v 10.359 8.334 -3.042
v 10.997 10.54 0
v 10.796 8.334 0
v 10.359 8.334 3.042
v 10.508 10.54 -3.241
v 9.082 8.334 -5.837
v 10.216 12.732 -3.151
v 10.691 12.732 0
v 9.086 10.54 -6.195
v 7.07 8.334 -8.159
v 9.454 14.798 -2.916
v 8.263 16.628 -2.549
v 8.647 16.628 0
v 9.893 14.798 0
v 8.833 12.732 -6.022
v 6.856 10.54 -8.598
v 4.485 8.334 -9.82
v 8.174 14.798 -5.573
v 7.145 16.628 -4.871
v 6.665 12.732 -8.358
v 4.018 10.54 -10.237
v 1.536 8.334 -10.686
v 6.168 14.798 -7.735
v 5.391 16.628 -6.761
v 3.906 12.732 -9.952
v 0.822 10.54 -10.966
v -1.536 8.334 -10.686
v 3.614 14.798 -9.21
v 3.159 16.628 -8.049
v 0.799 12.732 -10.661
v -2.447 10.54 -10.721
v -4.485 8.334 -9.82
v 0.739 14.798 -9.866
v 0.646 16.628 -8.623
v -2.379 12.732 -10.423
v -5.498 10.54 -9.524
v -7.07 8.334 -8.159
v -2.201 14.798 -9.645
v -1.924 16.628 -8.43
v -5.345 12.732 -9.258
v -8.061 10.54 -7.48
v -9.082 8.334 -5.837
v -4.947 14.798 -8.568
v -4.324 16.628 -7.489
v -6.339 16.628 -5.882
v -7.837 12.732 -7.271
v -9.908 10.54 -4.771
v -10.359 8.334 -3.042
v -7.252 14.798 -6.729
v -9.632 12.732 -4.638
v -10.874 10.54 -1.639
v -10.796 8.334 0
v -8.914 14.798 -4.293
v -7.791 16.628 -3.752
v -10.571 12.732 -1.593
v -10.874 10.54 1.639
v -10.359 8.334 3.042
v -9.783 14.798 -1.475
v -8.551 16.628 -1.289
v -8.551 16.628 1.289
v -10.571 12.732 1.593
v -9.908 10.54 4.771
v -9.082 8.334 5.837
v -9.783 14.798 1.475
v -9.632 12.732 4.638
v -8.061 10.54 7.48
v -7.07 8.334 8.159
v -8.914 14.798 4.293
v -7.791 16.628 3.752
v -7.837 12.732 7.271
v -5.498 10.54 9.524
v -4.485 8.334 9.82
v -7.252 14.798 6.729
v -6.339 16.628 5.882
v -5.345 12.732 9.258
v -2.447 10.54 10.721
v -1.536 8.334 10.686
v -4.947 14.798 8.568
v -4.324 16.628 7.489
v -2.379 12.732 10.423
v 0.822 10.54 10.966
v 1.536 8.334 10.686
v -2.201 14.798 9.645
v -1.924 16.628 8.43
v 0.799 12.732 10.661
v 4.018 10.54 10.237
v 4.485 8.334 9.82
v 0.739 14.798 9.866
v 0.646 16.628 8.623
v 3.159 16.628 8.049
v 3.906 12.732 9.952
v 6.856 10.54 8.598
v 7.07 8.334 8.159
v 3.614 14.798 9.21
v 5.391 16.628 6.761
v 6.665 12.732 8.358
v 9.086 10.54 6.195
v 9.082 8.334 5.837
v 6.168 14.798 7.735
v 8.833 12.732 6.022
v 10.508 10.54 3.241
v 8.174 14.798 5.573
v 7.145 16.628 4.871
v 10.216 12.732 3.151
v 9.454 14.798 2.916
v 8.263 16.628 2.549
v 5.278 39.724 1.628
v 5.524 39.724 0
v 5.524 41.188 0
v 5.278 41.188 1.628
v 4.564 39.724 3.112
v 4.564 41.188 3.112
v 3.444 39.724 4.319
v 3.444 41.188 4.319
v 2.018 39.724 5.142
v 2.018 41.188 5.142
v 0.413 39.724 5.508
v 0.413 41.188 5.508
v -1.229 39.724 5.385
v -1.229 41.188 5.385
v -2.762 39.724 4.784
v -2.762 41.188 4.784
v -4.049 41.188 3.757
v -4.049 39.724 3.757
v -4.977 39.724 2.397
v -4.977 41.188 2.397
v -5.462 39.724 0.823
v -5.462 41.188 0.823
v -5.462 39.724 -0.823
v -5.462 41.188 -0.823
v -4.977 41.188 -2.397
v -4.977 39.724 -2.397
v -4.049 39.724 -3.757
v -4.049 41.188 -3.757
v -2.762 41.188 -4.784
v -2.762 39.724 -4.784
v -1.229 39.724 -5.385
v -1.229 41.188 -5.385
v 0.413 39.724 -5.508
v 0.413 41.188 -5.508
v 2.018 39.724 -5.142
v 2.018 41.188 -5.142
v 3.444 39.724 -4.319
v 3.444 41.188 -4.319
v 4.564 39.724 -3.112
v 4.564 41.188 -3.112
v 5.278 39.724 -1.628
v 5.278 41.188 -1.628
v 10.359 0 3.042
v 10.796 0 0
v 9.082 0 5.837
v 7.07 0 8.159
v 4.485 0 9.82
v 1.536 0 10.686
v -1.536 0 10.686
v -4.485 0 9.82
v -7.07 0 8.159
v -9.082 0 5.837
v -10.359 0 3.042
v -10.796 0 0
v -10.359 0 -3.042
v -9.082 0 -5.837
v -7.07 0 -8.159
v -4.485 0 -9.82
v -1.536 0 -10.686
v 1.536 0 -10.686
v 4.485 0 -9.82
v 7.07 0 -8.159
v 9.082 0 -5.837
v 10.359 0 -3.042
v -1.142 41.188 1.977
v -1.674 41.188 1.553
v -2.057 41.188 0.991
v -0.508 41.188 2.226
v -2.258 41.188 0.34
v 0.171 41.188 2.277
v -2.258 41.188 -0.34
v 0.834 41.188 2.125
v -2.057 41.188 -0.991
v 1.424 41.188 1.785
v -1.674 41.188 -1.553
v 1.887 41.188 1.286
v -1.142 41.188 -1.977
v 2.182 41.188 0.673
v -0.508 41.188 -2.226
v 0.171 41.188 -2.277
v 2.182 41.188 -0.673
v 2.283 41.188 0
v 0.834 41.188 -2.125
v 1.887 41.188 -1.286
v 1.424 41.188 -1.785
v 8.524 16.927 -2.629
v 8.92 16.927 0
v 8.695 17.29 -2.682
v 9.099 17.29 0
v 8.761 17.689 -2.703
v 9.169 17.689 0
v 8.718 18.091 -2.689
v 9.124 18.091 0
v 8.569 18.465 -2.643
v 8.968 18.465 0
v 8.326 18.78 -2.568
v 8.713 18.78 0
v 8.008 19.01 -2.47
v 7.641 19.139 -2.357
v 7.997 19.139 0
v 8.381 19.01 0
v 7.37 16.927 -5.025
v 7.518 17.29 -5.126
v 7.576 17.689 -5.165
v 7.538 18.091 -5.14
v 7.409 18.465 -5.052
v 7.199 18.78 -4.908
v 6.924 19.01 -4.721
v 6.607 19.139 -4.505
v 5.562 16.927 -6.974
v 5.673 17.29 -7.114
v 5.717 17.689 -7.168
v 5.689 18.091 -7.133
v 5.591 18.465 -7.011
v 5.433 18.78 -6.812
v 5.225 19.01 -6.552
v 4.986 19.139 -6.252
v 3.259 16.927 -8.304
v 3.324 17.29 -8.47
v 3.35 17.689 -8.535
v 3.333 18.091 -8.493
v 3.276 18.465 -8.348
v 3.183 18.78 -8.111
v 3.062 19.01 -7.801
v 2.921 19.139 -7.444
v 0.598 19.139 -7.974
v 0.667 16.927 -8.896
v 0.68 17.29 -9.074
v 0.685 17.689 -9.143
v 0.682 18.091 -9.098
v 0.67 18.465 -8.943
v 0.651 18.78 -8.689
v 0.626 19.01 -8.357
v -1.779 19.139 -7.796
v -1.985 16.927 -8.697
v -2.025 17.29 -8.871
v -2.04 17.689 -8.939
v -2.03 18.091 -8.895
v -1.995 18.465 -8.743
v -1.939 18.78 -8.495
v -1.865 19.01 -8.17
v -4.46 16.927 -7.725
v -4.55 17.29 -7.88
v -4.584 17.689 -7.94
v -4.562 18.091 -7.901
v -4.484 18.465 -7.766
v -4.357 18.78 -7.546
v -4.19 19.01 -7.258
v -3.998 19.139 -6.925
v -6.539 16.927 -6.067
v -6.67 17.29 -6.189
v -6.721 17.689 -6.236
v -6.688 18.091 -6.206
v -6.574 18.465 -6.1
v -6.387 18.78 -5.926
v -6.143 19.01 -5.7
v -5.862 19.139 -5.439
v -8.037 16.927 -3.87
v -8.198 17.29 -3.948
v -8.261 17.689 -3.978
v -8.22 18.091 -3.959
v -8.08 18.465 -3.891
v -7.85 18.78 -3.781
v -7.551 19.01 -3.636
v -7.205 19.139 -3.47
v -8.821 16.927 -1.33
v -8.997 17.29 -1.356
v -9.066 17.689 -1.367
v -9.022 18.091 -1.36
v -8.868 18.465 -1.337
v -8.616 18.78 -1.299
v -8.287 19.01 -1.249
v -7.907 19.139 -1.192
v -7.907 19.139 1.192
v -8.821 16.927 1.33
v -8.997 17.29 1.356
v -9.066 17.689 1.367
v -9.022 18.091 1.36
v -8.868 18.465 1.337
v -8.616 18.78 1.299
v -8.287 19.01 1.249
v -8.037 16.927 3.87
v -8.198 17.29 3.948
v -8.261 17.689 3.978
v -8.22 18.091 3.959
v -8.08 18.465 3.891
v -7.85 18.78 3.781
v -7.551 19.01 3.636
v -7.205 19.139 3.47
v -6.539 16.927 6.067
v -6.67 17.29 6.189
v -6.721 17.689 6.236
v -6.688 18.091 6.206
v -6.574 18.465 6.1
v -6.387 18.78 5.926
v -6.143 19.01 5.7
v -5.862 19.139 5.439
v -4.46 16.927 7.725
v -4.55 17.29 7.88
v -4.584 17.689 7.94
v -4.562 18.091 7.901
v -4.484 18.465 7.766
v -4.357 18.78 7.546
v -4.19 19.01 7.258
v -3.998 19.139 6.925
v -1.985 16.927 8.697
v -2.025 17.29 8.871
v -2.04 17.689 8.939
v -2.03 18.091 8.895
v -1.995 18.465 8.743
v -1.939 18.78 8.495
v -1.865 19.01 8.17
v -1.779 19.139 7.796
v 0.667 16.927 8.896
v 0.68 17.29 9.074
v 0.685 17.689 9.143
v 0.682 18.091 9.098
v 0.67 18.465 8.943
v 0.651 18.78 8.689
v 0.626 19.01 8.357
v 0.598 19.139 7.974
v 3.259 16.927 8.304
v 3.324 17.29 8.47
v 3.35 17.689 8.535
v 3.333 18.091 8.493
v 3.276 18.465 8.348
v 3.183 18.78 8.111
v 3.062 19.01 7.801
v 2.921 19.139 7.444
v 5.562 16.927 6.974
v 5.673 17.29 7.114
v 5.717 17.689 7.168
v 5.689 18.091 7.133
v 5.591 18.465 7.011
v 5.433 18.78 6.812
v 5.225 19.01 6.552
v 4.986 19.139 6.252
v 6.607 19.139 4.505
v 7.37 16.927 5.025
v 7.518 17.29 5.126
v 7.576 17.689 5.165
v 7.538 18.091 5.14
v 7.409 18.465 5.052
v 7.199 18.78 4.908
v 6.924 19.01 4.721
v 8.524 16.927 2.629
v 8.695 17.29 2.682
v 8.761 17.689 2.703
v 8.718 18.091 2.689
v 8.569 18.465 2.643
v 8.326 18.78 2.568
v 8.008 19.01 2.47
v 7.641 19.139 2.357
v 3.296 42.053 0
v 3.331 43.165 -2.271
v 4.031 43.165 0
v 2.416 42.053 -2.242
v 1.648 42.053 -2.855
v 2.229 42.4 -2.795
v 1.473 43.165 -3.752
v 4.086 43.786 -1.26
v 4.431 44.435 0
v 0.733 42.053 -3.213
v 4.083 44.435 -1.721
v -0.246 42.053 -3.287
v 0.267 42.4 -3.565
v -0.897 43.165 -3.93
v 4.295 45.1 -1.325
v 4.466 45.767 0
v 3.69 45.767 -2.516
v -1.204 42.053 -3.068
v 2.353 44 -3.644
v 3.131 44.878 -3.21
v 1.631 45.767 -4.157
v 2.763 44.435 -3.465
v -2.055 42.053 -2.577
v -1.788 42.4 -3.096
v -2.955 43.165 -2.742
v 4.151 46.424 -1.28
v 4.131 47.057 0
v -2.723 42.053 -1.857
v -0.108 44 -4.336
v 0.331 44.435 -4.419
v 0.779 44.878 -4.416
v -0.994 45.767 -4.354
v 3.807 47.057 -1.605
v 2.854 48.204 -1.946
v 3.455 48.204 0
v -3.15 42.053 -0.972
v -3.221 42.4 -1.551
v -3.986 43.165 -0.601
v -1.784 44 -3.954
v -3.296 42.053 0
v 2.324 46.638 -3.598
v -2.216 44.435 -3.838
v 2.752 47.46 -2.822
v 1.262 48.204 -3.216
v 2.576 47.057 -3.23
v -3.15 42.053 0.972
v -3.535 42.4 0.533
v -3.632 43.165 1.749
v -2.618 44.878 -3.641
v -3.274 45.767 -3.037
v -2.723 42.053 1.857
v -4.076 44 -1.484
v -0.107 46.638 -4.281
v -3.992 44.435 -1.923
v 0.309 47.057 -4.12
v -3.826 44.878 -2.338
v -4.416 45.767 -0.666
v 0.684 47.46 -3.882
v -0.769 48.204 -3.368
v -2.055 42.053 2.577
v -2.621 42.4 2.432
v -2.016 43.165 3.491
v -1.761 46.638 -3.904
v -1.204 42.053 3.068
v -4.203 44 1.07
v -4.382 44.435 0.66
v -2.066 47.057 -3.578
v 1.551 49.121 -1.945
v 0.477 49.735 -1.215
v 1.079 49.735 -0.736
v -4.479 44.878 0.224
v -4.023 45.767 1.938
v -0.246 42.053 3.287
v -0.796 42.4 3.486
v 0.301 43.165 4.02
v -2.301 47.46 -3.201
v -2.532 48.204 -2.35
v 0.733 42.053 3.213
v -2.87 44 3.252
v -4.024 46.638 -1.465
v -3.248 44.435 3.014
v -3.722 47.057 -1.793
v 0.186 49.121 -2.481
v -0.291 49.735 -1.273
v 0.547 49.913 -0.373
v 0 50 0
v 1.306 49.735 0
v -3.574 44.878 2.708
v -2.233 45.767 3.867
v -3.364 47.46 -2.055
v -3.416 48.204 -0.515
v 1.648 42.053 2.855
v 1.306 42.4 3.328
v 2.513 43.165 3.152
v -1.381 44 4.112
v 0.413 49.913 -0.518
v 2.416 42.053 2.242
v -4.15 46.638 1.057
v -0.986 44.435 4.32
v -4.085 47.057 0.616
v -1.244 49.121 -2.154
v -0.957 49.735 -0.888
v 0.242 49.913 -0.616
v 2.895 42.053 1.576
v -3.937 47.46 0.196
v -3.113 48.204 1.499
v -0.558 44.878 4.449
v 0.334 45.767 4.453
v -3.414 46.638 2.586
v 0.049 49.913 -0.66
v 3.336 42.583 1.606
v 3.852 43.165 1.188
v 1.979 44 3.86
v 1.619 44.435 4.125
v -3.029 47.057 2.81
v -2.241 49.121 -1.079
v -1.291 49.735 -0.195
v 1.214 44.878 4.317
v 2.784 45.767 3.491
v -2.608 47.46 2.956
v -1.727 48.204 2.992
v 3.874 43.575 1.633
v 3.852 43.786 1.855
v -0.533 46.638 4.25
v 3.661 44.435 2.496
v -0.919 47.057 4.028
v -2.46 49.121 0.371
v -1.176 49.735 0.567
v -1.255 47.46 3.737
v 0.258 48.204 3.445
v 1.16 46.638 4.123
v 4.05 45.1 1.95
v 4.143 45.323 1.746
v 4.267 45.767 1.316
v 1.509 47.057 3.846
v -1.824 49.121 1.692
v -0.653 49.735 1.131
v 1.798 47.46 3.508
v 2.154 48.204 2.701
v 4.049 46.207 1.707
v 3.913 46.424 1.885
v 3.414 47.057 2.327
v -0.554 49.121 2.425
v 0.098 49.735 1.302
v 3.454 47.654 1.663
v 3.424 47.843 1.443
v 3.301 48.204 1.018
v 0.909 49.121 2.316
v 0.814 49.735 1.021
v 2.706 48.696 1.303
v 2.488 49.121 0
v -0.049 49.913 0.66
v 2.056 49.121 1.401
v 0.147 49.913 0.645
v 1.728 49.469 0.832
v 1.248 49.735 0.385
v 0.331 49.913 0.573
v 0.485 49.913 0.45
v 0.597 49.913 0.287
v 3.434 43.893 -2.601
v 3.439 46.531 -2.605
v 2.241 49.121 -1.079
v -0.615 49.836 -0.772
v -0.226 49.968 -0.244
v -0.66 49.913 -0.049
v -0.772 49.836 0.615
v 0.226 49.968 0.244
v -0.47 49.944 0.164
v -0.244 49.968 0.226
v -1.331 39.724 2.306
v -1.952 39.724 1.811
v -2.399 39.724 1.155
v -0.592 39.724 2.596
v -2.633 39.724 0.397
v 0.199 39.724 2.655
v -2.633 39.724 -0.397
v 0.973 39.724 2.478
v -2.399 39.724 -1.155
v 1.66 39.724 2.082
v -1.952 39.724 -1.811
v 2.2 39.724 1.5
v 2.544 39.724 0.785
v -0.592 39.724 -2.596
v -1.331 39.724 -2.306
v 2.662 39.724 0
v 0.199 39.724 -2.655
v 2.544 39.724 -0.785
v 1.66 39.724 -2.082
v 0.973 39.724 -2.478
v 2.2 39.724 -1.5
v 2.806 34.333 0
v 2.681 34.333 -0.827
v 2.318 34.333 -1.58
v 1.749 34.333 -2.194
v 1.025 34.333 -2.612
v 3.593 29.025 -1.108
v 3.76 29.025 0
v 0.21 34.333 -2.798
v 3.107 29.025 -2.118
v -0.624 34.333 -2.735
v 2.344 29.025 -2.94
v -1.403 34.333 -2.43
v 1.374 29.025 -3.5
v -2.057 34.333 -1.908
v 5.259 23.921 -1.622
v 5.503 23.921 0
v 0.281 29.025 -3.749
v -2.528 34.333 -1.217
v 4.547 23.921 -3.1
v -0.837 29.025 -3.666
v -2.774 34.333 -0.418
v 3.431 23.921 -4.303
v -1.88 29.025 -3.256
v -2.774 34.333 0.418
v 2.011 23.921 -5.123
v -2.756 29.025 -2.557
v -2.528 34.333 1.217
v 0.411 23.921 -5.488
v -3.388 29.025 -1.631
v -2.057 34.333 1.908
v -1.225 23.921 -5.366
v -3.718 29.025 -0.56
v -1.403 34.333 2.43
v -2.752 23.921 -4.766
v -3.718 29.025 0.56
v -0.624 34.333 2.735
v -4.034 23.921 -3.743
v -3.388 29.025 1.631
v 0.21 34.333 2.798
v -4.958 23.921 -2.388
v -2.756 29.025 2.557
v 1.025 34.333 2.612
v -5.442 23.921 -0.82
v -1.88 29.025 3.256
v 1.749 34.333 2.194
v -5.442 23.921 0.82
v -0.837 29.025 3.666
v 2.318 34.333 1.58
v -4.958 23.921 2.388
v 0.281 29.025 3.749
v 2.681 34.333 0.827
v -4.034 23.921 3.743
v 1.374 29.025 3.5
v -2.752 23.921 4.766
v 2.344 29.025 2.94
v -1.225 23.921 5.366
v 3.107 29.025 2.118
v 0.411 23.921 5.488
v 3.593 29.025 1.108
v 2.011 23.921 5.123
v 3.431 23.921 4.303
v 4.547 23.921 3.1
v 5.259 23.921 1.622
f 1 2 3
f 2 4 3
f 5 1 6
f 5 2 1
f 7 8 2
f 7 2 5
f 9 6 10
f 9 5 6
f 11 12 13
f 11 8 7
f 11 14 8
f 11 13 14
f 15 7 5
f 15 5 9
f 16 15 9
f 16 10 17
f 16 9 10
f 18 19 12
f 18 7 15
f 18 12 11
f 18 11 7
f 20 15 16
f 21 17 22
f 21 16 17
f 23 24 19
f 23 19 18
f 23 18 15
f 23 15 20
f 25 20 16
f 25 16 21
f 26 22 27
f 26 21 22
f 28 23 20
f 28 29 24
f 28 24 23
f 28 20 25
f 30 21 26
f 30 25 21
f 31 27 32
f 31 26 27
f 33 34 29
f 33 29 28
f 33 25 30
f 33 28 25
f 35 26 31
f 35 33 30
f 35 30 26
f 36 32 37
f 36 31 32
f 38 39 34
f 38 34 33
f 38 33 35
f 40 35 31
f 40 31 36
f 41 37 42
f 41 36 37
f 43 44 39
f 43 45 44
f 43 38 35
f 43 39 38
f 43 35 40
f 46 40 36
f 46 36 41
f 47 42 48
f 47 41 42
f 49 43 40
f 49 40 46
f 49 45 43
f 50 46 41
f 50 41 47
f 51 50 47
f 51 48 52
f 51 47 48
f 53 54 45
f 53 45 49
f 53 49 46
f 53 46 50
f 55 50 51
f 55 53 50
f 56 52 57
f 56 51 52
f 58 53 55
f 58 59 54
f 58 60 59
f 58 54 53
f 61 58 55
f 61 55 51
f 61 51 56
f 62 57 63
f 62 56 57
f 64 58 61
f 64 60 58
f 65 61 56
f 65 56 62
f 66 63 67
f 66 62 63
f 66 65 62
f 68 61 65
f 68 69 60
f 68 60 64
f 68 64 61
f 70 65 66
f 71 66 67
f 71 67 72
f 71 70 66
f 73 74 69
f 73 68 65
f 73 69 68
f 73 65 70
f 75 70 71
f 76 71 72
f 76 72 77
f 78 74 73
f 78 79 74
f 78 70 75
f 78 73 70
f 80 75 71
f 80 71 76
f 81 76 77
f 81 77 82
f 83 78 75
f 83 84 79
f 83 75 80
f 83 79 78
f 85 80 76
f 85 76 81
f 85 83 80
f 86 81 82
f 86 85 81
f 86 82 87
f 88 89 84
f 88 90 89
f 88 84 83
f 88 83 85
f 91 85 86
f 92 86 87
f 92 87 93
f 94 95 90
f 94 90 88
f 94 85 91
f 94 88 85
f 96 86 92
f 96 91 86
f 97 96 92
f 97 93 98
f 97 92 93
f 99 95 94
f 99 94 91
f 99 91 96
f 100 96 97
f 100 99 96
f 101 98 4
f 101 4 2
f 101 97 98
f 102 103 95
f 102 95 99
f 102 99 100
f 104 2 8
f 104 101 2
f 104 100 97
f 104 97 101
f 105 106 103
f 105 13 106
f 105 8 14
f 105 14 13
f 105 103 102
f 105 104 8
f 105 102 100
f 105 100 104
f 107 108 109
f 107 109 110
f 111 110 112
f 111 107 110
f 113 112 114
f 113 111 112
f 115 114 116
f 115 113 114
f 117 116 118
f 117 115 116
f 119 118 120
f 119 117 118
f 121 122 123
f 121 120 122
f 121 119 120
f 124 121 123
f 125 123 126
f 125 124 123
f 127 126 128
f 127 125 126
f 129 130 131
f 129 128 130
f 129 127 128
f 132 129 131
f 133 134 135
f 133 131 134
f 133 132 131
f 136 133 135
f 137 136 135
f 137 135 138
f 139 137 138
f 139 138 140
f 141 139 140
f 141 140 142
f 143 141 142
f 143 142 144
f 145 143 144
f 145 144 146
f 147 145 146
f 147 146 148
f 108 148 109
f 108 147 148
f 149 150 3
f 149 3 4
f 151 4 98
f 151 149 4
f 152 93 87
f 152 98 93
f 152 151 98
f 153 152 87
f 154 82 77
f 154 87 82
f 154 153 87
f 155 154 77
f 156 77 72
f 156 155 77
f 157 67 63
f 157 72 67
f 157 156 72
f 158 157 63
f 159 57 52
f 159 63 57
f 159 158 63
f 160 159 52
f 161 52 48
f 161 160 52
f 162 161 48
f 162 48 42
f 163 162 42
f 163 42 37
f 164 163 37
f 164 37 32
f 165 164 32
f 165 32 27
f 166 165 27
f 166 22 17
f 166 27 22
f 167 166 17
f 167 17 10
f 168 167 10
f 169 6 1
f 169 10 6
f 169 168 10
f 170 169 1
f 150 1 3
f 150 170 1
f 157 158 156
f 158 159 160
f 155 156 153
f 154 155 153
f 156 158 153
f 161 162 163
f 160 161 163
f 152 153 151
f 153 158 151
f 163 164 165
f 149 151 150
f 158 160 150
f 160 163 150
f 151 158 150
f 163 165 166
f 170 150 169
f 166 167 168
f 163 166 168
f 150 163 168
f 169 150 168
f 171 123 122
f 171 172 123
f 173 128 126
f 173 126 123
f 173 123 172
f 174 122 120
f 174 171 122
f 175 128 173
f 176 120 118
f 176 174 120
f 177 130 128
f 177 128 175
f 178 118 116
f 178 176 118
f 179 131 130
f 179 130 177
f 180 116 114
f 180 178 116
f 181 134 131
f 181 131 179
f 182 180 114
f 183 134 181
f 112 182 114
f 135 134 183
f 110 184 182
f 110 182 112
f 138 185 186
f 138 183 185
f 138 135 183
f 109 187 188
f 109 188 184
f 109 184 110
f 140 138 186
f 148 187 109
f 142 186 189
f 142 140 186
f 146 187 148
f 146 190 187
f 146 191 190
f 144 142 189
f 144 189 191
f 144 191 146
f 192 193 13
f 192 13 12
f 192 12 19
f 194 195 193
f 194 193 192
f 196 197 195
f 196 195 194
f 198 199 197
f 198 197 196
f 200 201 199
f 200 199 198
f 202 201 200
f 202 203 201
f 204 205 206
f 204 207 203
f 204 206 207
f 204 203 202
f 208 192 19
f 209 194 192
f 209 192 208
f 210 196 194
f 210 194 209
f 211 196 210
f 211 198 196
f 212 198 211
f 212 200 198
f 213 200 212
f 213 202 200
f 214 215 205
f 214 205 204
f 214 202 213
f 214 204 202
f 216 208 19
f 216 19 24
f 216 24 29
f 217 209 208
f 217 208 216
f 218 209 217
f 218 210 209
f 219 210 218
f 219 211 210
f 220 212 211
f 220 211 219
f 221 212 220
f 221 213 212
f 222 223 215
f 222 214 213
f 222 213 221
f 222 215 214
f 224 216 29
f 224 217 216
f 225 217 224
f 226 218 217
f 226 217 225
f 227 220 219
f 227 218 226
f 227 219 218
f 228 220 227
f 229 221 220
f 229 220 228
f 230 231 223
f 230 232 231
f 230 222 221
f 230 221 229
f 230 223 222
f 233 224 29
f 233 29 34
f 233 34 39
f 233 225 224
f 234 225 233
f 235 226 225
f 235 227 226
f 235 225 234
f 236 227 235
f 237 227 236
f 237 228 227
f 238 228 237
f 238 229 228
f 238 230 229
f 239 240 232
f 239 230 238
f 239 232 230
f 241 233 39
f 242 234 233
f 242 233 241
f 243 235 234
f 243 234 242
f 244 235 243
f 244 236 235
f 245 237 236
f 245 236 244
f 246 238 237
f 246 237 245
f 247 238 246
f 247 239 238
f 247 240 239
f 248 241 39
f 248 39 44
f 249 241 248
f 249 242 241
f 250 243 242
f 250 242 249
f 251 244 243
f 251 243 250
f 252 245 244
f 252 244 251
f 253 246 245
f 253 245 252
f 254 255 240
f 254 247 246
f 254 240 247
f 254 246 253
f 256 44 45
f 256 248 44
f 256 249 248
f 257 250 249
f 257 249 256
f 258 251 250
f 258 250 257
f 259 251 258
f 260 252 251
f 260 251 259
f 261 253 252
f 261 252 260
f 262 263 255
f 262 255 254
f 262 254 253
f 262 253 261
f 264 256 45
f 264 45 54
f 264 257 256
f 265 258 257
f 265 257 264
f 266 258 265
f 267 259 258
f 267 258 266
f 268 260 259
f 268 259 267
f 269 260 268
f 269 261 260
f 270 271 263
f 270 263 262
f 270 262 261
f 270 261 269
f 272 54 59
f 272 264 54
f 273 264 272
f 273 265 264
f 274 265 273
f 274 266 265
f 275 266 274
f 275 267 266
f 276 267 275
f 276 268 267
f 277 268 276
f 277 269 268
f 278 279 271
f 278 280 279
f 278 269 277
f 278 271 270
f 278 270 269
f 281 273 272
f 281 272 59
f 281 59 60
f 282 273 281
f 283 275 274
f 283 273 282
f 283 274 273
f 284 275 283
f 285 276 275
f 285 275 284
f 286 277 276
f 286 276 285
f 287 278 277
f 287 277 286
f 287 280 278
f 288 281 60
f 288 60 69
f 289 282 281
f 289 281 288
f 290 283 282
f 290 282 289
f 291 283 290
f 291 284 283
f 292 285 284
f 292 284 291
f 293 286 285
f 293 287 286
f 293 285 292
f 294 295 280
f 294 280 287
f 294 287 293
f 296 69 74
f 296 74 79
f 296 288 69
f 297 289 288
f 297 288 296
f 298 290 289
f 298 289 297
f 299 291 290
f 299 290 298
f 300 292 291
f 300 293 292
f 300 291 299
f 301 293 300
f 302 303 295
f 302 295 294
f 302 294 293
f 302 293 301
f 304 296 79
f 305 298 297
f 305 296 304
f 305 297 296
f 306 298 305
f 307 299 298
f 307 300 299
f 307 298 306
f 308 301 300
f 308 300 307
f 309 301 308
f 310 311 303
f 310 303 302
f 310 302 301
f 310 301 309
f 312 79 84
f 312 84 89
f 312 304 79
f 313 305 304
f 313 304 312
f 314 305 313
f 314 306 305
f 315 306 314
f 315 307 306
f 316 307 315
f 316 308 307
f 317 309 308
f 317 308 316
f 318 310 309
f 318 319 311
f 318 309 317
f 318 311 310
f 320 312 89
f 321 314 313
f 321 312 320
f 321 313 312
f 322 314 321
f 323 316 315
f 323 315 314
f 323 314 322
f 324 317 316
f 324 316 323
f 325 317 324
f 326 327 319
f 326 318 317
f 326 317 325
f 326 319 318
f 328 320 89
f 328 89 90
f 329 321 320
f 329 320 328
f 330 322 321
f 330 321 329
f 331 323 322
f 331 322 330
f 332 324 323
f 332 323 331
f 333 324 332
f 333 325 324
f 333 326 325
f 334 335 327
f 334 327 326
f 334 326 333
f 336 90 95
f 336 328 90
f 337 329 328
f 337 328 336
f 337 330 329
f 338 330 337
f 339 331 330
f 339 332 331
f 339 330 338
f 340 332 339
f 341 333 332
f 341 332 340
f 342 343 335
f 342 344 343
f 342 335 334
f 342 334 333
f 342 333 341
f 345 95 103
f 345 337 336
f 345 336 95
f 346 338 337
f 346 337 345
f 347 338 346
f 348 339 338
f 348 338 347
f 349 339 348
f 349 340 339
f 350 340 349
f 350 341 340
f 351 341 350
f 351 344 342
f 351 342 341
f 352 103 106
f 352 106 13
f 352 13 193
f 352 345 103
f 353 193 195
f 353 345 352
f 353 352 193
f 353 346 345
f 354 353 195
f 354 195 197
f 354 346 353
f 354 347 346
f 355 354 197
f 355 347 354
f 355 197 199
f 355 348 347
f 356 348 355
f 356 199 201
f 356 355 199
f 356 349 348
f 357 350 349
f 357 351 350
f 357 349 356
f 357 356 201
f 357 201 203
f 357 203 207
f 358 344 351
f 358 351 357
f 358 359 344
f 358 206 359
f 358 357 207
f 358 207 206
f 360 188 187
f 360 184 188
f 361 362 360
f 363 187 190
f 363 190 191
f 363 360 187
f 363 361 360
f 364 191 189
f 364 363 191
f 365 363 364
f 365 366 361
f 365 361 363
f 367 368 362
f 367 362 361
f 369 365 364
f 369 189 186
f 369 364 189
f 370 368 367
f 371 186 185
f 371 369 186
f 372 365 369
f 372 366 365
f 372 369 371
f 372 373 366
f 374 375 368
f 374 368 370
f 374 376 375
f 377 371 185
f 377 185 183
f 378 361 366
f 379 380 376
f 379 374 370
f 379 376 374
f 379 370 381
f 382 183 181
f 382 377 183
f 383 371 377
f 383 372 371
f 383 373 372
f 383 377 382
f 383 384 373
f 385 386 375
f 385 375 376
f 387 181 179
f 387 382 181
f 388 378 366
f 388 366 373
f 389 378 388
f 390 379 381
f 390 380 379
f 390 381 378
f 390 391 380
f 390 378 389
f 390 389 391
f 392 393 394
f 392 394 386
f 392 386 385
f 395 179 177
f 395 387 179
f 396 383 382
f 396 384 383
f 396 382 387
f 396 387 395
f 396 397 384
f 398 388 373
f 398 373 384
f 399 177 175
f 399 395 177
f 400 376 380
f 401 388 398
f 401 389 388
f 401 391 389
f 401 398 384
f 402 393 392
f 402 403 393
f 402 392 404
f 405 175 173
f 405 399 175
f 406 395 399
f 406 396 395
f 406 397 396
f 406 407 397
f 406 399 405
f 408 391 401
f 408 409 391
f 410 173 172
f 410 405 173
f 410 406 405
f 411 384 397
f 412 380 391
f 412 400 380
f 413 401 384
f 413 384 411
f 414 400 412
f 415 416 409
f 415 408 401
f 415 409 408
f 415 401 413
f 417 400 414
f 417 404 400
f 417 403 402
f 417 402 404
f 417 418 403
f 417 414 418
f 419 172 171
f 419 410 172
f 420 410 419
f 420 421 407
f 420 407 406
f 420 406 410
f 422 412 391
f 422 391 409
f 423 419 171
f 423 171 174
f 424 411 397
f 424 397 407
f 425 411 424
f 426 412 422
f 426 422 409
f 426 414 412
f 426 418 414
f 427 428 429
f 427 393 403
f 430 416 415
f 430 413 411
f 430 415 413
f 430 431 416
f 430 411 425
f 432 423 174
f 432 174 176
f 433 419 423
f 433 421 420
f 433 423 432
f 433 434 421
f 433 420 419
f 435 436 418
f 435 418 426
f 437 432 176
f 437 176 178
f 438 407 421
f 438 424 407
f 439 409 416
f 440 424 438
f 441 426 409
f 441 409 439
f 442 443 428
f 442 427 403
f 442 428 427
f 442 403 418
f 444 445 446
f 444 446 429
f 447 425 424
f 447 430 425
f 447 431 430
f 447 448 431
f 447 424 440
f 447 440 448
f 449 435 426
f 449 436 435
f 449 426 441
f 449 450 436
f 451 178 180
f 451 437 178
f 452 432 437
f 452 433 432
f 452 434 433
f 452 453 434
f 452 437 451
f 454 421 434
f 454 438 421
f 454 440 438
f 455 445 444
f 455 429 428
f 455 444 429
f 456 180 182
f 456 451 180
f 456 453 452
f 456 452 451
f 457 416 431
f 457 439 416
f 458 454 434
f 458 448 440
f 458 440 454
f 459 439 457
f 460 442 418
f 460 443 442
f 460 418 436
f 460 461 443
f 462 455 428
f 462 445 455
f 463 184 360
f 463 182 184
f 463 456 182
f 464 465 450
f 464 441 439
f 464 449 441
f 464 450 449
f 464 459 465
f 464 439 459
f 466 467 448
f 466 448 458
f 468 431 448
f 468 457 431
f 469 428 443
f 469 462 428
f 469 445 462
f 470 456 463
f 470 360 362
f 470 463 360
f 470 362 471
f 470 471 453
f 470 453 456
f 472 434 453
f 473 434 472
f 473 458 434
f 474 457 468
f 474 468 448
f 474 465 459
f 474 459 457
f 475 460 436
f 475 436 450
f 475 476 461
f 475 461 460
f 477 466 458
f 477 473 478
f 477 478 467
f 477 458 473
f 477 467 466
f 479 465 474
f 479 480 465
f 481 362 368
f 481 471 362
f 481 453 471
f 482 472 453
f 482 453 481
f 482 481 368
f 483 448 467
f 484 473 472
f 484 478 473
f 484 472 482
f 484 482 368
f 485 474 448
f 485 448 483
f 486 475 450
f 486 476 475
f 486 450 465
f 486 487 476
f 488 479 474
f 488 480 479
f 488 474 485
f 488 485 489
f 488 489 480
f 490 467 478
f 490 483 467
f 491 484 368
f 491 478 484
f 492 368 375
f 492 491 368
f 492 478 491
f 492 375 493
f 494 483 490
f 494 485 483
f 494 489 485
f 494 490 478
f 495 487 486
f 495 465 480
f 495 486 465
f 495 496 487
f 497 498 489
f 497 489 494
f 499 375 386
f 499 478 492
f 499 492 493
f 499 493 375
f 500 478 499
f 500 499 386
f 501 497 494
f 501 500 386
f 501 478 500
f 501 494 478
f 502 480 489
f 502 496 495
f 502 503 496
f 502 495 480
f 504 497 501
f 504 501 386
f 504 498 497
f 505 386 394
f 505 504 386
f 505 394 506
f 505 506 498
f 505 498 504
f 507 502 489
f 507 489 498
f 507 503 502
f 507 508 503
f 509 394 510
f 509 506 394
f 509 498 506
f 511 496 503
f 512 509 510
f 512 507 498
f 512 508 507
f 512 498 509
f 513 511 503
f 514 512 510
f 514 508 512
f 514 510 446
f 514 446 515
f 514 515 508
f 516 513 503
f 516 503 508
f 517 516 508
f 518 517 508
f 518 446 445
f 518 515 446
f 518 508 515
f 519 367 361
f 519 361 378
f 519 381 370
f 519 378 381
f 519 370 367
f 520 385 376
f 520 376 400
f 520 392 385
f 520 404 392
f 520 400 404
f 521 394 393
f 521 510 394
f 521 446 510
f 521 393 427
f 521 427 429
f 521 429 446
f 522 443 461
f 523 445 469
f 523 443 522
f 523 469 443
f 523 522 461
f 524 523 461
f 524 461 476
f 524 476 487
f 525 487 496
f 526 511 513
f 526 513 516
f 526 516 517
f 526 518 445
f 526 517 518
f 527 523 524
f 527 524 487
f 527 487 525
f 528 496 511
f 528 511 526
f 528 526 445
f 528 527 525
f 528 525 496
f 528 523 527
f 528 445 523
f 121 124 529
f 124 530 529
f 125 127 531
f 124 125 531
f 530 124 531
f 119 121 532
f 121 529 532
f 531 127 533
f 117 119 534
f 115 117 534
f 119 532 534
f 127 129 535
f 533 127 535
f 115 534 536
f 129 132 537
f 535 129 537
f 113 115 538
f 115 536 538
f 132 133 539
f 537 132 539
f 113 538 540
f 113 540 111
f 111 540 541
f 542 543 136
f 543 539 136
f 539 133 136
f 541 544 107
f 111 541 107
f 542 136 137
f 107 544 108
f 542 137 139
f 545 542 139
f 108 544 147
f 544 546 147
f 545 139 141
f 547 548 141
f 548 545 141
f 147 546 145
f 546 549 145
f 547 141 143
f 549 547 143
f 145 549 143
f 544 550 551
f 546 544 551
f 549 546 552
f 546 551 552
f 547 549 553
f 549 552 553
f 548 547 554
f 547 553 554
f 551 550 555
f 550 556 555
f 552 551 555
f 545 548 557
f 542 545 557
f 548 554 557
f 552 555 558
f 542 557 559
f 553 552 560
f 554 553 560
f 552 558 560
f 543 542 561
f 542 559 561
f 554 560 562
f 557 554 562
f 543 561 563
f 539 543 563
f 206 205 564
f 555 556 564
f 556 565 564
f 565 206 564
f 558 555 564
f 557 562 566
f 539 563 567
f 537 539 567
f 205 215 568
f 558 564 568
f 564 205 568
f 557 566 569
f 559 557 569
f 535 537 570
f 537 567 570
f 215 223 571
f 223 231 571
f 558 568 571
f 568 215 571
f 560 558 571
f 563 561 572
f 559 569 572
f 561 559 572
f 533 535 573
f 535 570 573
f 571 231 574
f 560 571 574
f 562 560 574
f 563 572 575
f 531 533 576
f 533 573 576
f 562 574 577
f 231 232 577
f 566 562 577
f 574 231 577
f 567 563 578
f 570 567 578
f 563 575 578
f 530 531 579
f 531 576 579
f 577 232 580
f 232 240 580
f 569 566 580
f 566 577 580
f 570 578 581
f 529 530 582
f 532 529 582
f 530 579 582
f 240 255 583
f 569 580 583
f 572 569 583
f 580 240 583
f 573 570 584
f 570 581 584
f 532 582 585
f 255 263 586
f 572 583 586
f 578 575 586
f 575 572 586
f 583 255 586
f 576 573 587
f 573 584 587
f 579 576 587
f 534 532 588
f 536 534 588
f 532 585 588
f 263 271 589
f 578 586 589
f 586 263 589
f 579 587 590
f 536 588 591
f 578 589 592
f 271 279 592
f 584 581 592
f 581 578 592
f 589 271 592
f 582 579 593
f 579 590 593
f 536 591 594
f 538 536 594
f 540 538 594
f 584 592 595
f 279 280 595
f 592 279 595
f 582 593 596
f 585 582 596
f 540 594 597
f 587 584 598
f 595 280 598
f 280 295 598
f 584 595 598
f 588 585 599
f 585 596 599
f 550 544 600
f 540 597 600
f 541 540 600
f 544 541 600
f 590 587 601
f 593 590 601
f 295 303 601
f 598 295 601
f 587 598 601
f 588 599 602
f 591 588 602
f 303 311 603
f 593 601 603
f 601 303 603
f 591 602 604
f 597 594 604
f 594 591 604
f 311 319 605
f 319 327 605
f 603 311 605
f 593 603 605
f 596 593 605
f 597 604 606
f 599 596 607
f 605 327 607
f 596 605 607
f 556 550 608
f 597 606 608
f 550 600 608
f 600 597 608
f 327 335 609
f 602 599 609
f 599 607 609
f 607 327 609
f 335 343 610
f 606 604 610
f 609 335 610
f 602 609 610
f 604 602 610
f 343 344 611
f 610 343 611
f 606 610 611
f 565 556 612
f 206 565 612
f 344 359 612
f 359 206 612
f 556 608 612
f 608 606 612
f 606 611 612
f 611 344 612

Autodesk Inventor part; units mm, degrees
ref_plane "YZ Plane" through (0, 0, 0) normal (1, 0, 0) x (0, 1, 0)
ref_plane "XZ Plane" through (0, 0, 0) normal (0, 1, 0) x (-1, 0, 0)
ref_plane "XY Plane" through (0, 0, 0) normal (0, 0, 1) x (1, 0, 0)
sketch "Boceto1" plane through (0, 0, 0) normal (0, 0, 1) x (1, 0, 0)
  line L0 (0, 0) -> (0, 50)
  line L1 (12.9556, 0) -> (0, 0)
  arc A0 (2.2833, 41.1879) -> (0, 50) centre (-0.2888, 45.2233) ccw
  line L2 (2.2833, 41.1879) -> (5.5239, 41.1879)
  line L3 (5.5239, 41.1879) -> (5.5239, 39.7245)
  line L4 (5.5239, 39.7245) -> (2.6625, 39.7245)
  arc A1 (2.6625, 39.7245) -> (7.9966, 19.1386) centre (38.2928, 37.9727) ccw
  arc A2 (8.6471, 16.6281) -> (7.9966, 19.1386) centre (7.7402, 17.7327) ccw
  arc A3 (10.796, 8.3345) -> (8.6471, 16.6281) centre (1.334, 10.308) ccw
  line L5 (10.796, 8.3345) -> (10.796, 0)
  dimension "d0" = 50
revolve "Revolución1" add sketch "Boceto1" angle 360 about axis through (0, 0, 0) along (0, 1, 0)
properties part number "PAWN"
